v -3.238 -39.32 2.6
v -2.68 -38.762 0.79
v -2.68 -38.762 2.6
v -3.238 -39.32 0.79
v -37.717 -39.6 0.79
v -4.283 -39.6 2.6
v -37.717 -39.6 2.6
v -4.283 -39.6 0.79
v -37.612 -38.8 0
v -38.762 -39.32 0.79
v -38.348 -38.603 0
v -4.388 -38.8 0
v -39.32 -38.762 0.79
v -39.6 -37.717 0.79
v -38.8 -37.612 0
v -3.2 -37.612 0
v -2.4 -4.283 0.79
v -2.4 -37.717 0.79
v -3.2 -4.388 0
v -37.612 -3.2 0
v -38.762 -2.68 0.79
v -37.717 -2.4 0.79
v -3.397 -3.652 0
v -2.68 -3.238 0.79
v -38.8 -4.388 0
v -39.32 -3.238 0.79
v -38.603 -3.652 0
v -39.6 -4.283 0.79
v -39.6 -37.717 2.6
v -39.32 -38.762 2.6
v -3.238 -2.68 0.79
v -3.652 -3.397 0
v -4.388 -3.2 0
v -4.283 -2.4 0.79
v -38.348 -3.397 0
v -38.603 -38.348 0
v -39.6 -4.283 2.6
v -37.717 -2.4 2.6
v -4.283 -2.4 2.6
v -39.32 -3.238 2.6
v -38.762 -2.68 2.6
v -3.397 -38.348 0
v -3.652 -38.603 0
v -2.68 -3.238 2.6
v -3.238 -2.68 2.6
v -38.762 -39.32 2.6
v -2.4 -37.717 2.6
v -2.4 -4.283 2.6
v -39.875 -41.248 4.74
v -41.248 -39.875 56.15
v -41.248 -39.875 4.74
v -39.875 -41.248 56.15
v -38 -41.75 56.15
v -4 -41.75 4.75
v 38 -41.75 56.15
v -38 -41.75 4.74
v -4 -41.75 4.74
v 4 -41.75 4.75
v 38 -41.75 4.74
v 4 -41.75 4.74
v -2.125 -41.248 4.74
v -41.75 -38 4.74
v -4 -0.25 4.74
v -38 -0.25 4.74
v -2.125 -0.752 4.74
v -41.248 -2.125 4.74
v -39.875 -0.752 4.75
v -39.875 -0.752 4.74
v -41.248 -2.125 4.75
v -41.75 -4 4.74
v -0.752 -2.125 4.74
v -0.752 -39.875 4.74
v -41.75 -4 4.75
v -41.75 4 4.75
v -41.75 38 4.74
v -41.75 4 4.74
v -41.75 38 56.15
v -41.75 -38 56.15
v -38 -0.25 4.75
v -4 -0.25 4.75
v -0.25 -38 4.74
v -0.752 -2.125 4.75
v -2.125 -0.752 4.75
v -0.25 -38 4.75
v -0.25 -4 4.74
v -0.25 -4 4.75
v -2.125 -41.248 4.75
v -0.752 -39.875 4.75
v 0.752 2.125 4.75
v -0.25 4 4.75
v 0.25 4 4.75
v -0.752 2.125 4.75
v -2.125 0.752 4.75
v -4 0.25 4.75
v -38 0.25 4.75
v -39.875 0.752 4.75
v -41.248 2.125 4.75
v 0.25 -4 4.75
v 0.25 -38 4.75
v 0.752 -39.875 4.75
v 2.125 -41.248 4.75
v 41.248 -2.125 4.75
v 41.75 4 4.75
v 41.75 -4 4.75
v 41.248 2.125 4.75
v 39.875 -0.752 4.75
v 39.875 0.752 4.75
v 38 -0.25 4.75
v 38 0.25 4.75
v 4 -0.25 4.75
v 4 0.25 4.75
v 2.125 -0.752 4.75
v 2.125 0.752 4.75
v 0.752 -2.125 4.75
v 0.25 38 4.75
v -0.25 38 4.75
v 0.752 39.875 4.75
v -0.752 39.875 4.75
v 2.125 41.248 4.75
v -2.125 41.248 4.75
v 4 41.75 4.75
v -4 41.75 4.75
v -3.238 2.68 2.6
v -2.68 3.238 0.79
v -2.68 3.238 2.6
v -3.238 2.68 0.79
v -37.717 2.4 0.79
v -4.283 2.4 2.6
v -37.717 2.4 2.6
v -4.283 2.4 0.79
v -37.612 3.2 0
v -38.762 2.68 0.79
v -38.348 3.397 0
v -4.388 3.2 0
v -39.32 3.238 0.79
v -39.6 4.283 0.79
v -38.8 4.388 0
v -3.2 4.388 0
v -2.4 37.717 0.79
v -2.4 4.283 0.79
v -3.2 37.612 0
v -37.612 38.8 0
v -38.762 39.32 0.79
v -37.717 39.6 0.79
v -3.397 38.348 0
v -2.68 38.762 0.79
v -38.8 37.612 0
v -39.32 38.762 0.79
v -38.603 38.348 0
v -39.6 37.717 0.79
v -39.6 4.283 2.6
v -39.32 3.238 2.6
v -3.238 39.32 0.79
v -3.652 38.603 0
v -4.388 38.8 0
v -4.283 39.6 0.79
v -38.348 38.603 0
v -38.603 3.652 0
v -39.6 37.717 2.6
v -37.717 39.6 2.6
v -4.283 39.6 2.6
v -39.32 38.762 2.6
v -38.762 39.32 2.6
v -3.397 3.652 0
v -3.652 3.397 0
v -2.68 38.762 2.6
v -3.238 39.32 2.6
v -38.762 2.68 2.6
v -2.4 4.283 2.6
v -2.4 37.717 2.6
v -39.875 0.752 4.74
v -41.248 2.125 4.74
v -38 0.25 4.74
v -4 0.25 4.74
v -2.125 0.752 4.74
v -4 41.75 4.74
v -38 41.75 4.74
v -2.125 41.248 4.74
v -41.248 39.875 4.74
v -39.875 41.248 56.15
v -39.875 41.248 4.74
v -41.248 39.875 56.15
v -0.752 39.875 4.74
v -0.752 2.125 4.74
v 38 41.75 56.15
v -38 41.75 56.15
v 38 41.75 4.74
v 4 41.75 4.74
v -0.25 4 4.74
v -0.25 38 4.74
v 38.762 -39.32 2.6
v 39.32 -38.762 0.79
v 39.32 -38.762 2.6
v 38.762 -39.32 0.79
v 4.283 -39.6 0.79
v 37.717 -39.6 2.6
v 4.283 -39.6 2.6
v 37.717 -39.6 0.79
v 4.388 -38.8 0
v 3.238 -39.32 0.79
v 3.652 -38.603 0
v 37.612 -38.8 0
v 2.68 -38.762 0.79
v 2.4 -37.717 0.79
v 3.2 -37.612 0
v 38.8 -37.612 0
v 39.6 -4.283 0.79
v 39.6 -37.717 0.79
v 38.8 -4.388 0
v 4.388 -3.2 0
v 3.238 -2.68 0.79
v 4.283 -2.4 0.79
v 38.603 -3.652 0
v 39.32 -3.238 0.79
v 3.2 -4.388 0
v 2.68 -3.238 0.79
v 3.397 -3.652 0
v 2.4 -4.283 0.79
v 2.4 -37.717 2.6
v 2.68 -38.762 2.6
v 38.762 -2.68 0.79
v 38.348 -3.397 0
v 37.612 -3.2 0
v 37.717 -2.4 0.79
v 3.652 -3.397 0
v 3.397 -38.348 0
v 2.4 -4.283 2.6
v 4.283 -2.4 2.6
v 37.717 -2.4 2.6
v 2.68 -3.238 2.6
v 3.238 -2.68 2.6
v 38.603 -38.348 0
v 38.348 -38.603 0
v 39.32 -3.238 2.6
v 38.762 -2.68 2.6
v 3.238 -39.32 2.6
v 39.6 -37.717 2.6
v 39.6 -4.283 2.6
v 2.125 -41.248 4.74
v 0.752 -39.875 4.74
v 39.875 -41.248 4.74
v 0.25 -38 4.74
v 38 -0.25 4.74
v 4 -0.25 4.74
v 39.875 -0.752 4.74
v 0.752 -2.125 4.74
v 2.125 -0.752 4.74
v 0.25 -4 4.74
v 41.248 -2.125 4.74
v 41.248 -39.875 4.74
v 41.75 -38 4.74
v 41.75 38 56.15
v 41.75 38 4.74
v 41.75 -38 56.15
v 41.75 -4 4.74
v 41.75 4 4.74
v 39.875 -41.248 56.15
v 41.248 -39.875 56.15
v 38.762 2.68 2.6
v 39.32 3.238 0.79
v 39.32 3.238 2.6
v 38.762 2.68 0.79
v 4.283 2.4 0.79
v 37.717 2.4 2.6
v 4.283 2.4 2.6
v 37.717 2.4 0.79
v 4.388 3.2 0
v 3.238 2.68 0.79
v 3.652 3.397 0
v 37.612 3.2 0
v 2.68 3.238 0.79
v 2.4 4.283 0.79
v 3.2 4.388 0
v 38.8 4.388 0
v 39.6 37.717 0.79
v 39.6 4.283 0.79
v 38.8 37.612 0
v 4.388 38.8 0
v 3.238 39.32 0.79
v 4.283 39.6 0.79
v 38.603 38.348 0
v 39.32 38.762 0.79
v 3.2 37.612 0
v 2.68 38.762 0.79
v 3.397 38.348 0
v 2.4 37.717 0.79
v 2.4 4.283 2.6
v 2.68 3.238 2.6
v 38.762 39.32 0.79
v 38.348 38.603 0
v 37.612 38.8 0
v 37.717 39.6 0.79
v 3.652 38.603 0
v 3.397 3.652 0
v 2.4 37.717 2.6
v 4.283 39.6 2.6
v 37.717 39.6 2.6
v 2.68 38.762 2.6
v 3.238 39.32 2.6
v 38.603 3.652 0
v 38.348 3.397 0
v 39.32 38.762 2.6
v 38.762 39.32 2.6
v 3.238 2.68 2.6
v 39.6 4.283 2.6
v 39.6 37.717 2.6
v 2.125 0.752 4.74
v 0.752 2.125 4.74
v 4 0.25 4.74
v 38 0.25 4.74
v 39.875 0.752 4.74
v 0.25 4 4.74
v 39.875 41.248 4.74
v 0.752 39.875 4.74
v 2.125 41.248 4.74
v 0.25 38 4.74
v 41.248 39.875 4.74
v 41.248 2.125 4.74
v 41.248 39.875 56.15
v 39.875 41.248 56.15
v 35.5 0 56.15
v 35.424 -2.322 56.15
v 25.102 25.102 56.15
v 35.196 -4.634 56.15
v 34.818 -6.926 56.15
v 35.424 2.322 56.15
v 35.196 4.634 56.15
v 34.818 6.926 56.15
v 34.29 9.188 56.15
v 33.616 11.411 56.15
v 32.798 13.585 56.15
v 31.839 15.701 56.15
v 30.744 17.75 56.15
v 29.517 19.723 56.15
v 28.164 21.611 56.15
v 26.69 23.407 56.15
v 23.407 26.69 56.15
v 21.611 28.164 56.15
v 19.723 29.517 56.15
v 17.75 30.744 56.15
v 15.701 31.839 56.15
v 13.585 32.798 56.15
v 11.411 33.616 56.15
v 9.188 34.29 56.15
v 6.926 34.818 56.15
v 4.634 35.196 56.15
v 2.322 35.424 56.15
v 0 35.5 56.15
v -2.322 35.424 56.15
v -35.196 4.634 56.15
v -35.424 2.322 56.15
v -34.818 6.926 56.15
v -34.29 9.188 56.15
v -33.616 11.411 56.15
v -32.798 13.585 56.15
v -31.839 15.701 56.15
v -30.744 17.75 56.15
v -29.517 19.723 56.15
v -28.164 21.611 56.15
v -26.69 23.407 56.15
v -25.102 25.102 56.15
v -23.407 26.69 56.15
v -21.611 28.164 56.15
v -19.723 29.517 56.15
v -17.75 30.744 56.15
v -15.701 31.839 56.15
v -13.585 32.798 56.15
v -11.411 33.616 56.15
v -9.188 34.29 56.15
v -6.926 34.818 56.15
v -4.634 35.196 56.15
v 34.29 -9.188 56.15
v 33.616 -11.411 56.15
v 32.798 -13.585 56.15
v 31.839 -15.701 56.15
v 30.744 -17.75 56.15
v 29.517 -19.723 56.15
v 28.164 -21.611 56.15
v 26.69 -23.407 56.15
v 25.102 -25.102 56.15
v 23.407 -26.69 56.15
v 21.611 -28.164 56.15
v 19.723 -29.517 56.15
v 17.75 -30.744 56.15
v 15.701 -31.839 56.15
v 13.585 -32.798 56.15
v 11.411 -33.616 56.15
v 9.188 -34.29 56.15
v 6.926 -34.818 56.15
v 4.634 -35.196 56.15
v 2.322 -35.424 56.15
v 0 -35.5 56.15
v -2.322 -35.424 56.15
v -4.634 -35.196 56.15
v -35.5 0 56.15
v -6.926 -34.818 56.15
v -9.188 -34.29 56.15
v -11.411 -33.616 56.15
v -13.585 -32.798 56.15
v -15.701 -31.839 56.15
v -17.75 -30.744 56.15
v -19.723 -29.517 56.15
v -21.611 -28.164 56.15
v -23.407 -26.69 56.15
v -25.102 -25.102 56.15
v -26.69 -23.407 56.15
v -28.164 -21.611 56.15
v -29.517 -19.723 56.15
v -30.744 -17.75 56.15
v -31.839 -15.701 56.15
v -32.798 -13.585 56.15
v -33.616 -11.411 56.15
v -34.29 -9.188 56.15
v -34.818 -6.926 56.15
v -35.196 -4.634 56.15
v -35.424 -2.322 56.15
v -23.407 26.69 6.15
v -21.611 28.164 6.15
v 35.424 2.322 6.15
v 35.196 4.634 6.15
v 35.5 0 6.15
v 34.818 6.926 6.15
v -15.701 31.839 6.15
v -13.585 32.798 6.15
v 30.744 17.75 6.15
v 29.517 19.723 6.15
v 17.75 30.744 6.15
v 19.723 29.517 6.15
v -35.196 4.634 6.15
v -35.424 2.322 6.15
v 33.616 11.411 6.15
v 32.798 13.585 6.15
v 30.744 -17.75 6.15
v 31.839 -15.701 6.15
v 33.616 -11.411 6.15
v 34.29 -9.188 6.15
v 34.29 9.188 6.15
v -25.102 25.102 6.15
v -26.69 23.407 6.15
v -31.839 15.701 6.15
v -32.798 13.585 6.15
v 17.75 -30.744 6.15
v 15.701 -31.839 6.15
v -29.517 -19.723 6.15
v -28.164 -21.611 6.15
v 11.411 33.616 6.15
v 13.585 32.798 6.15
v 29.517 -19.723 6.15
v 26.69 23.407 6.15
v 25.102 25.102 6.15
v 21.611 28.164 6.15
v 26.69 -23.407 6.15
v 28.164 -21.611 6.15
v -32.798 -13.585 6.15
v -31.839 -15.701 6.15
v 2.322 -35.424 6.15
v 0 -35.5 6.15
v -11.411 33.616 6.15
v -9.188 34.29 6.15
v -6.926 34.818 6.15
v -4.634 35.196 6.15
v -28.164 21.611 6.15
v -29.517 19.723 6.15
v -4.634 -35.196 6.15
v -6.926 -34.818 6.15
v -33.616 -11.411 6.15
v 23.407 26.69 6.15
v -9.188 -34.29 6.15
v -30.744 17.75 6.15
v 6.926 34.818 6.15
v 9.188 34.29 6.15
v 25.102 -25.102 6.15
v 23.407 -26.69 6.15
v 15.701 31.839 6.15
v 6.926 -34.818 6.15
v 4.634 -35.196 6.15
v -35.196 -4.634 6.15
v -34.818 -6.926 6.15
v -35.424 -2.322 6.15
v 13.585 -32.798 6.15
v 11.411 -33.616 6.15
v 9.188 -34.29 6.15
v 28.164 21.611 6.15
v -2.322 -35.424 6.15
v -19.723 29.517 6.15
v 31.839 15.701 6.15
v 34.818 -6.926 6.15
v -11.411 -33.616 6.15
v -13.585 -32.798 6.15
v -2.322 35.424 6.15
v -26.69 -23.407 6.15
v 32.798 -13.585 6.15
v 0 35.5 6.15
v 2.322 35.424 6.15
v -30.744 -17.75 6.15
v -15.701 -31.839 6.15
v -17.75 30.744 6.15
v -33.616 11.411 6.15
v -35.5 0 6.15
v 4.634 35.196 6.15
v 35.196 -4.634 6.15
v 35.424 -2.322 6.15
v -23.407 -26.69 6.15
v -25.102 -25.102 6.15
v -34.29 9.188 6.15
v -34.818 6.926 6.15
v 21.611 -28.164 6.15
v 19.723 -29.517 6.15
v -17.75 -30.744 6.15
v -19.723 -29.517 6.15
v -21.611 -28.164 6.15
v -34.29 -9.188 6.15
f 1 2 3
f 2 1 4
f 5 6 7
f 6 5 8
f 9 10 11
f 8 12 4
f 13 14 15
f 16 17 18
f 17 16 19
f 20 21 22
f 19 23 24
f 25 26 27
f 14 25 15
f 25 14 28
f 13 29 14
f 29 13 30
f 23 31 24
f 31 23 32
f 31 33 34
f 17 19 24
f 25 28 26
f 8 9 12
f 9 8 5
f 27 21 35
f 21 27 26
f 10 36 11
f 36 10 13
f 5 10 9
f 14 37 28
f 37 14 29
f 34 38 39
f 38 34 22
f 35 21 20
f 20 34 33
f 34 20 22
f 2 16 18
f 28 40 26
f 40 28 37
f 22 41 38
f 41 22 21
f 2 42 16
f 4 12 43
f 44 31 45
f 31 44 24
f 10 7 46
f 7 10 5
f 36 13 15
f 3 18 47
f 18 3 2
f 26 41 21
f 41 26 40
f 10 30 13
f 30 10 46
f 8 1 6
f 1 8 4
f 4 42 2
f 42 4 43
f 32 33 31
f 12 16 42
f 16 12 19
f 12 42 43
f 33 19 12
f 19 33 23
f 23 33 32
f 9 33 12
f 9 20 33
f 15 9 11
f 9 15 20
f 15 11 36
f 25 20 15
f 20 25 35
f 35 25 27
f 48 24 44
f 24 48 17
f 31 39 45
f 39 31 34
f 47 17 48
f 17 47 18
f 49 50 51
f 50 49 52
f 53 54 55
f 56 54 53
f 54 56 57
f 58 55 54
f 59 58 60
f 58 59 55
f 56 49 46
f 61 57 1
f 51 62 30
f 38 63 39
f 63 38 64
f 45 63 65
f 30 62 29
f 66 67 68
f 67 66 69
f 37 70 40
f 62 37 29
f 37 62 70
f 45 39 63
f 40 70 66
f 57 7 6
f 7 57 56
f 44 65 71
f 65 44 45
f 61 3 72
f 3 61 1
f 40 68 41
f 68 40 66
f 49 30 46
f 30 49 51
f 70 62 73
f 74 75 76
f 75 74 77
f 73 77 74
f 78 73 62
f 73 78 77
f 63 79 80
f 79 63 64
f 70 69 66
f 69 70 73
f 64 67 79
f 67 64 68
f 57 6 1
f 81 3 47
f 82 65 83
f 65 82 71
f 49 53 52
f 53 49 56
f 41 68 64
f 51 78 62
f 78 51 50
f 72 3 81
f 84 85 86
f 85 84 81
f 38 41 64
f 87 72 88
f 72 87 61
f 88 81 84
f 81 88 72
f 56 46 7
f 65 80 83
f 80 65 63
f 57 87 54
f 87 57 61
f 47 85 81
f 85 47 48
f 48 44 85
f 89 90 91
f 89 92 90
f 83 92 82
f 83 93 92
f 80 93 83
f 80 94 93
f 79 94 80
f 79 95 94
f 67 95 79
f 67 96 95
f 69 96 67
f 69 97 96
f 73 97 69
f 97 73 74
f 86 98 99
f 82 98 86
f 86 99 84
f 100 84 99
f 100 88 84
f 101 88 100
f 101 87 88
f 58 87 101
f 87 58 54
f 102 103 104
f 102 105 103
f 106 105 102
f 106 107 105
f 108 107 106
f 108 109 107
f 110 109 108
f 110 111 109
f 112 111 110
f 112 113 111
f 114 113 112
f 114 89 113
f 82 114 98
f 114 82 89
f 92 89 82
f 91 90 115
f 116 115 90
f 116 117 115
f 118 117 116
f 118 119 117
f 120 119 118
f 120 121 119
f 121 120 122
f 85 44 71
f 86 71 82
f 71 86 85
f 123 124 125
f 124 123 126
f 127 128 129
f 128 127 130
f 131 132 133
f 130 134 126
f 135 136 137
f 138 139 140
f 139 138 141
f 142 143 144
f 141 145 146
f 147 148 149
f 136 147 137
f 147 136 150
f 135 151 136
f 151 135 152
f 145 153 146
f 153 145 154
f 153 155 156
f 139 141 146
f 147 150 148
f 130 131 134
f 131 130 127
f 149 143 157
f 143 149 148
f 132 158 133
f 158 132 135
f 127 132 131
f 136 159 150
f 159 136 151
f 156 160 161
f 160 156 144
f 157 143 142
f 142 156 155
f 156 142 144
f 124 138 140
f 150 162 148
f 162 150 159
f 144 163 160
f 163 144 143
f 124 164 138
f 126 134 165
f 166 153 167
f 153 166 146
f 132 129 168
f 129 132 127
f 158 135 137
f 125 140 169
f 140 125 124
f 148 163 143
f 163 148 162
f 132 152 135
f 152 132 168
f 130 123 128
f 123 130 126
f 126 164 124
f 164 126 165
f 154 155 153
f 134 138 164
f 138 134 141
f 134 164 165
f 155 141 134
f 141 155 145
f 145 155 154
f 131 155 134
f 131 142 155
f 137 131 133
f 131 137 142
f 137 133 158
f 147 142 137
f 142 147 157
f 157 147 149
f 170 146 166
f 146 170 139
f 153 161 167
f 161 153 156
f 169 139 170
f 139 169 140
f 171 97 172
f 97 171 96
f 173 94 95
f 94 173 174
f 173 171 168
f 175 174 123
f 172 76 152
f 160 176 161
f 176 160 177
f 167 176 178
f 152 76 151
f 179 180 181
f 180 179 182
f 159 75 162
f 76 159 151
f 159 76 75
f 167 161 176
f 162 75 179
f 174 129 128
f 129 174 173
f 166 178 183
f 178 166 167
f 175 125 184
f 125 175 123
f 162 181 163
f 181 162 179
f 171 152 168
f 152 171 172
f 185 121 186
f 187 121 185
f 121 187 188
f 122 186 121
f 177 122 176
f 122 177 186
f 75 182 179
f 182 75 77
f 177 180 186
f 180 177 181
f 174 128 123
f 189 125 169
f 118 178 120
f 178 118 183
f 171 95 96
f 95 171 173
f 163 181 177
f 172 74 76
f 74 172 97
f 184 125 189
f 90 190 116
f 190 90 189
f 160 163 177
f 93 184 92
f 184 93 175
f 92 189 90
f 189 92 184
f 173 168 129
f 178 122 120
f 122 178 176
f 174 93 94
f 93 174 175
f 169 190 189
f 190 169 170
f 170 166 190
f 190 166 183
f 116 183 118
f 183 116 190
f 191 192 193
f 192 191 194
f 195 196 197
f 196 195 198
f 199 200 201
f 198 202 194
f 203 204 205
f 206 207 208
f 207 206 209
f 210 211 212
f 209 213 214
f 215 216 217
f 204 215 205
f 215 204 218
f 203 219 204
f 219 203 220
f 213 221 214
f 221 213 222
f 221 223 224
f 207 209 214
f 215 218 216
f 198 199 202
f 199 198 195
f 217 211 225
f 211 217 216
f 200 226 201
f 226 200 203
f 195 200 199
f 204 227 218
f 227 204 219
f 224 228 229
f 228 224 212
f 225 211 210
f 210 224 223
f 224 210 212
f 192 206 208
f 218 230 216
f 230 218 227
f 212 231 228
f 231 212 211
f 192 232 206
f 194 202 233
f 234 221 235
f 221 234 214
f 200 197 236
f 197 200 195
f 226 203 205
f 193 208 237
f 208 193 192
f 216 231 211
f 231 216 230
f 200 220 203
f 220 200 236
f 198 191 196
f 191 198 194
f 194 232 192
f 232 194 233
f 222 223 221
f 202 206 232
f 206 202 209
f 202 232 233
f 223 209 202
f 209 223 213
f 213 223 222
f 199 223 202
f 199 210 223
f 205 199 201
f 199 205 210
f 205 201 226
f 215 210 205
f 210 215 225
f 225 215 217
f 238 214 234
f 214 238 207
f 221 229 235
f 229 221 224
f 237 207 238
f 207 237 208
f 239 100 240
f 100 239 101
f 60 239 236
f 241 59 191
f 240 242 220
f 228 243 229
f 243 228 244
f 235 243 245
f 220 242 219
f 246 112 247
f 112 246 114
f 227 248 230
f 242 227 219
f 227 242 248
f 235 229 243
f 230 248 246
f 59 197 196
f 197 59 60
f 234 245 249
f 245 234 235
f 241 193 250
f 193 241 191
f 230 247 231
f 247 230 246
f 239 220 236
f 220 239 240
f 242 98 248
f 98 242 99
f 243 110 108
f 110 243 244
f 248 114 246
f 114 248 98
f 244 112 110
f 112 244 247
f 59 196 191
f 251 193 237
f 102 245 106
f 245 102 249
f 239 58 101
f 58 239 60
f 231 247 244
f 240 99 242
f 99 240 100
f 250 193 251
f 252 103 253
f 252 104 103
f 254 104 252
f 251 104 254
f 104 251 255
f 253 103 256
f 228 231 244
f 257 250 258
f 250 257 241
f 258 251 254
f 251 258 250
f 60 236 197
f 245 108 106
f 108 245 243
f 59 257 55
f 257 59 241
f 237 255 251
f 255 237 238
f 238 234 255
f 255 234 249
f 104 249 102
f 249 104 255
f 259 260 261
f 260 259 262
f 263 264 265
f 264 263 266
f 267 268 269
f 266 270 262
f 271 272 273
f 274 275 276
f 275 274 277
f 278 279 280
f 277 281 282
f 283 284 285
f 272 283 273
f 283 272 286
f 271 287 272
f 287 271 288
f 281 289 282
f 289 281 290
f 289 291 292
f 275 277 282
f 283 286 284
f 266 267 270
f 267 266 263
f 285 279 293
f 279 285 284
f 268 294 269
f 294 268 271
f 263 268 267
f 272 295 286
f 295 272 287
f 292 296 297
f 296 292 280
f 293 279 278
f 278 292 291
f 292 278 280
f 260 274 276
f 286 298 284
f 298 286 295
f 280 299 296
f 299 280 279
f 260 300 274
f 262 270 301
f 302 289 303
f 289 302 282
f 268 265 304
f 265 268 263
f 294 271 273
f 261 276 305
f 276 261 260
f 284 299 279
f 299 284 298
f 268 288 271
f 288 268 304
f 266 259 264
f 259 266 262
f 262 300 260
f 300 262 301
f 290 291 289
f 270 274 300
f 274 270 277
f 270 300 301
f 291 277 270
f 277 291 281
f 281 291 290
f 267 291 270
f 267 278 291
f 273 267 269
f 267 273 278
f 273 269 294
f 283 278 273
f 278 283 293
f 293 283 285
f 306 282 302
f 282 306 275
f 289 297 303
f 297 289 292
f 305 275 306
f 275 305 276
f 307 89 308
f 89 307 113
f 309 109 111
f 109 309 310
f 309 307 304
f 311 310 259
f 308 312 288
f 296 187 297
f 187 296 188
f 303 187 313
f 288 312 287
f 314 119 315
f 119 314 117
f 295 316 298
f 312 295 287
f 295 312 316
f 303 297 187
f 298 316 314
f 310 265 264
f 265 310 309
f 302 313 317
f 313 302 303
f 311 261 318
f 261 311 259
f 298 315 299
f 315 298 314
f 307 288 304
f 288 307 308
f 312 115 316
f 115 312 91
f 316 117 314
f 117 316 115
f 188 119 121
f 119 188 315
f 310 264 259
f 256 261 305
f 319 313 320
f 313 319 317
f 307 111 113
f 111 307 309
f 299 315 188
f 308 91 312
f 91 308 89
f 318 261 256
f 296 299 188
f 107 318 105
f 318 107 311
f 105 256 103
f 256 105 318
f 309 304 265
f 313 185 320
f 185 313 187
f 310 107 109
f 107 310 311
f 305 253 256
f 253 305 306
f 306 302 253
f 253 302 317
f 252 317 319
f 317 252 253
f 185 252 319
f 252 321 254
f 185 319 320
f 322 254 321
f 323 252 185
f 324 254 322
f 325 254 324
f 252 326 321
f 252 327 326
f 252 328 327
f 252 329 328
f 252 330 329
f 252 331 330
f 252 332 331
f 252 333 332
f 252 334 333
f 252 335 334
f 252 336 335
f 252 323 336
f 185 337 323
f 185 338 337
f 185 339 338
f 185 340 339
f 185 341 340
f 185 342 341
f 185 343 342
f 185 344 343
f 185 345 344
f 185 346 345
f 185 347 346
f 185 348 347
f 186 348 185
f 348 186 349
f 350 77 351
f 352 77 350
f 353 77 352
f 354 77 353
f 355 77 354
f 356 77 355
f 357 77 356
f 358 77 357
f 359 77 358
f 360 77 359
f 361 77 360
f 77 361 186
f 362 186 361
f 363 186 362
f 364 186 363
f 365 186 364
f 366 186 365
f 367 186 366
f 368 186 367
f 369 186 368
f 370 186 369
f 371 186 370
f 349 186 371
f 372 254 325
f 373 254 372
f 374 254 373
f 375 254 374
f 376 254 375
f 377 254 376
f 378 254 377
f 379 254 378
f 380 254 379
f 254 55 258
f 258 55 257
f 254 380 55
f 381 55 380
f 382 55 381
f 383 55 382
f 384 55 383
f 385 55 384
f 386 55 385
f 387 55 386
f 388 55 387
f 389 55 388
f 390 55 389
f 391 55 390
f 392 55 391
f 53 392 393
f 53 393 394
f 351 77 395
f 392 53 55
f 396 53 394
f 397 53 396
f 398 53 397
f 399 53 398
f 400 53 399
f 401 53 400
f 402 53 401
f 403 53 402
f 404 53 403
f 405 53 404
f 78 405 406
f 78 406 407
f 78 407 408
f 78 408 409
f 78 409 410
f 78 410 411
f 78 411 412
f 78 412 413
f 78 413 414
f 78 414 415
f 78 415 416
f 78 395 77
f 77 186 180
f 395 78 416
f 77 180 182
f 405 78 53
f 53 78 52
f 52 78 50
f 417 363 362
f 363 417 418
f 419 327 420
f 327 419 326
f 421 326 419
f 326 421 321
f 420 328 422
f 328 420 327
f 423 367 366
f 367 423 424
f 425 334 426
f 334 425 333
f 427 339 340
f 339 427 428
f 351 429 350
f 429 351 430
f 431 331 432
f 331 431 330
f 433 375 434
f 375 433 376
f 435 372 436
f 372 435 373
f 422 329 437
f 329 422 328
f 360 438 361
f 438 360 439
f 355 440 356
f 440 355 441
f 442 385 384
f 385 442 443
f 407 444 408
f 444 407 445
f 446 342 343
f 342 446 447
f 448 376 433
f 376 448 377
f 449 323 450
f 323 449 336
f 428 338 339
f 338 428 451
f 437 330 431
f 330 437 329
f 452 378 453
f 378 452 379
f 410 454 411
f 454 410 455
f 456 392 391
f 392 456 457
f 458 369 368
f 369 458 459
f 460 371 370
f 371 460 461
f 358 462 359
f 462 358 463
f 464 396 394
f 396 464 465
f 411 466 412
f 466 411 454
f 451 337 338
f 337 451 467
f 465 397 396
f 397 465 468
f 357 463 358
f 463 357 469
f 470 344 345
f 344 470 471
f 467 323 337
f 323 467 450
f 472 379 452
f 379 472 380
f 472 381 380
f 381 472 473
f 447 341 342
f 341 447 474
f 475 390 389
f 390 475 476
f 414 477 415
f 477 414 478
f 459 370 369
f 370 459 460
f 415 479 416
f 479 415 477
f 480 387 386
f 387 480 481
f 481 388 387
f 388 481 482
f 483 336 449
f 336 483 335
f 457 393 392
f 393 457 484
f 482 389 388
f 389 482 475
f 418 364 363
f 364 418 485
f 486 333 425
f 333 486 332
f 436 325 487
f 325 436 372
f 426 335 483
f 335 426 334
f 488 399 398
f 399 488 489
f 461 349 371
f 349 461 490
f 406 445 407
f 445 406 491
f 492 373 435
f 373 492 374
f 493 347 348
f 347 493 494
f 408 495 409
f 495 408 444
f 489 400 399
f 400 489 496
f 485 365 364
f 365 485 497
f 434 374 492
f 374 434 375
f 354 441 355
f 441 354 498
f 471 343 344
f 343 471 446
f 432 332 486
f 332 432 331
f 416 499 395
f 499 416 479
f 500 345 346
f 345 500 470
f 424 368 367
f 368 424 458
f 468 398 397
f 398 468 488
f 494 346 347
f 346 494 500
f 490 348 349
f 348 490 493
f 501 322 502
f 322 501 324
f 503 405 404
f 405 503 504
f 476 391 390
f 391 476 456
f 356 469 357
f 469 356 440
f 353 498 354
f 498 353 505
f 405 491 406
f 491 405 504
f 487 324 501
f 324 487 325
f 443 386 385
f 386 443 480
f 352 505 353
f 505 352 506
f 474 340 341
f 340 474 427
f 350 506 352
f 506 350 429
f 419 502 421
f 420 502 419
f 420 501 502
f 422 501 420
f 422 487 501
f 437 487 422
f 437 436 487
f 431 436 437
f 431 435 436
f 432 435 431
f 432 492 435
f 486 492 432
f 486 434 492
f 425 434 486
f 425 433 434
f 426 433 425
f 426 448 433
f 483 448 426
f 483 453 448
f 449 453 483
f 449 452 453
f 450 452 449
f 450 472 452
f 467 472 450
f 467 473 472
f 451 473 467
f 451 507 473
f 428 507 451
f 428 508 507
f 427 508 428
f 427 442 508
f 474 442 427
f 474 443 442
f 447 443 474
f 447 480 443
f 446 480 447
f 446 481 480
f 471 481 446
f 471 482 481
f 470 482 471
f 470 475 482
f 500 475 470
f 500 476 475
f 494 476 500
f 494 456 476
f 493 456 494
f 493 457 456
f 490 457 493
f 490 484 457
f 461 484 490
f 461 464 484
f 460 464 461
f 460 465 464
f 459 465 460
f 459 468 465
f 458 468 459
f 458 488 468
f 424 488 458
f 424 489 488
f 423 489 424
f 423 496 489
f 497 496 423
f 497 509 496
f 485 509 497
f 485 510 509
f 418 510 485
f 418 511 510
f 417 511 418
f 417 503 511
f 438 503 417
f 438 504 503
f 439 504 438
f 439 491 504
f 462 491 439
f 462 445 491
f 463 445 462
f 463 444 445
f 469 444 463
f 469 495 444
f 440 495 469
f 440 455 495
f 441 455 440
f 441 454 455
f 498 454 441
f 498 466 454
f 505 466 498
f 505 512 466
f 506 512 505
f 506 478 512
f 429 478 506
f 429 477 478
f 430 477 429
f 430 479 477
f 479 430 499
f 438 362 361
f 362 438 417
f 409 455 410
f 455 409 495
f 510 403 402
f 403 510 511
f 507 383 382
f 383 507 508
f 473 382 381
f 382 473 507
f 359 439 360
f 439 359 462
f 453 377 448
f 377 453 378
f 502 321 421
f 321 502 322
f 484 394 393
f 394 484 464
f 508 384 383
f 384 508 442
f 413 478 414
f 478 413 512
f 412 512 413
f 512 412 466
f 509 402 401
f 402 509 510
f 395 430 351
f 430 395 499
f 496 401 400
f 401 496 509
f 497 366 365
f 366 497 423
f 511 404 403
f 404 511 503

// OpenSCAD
// file: ../lib/vessel.scad
// SPDX-License-Identifier: MIT
// Copyright (c) 2026 Aaron Cupp
//
// vessel.scad — parametric collar cups for bottles, cans, and pen-form tools.
//
// A collar cup is a solid Gridfinity block with cylindrical bores sunk into it.
// It LOCATES a vessel; it does not clamp one. That distinction is the whole
// design: a collar that grips harder than the bin weighs comes out of the
// baseplate with the bottle when you grab it one-handed. Clearance, not
// interference — CLR is per-diameter, not per-side.
//
// Capture depth is roughly a third of the vessel's height. Enough to resist a
// knock (this bench sits under a 180 W fume-extractor intake), not so much that
// you're fishing the bottle out.
//
//   collar_cup(nx, ny, vessel_d, capture_h, …)   — one centred bore
//   collar_cup_multi(nx, ny, bores, capture_h, …) — bores = [[x, y, d], …]
//
// Cord slot: pen-form tools that stand in a cup are usually corded (the HARDELL
// rotary tool takes a barrel jack). Without a slot the lead drapes over the rim
// and levers the tool sideways. `cord_w > 0` cuts a channel from the bore out
// through the wall, open to the top.

include <gridfinity.scad>

CLR      = 1.0;   // bore = vessel_d + CLR. Loose on purpose — see above.
MIN_WALL = 1.2;   // minimum material between two bores, and bore to outer face

// ---- geometry guards ----
// Overlapping bores and bores that break out through the side wall both still
// render as perfectly watertight, 2-manifold meshes — CI cannot tell you the
// part is wrong, only that it is closed. These asserts encode the intent that
// the mesh check can't. Cheap, and they fire at render time rather than on the
// printer.
function _pair_gaps(bores, clr) = [
    for (i = [0 : len(bores)-1], j = [0 : len(bores)-1]) if (i < j)
        norm([bores[i][0]-bores[j][0], bores[i][1]-bores[j][1]])
        - (bores[i][2]+clr)/2 - (bores[j][2]+clr)/2
];
function _edge_gaps(bores, clr, W, D) = [
    for (b = bores) min(W/2 - abs(b[0]) - (b[2]+clr)/2,
                        D/2 - abs(b[1]) - (b[2]+clr)/2)
];

// Multi-bore block. Bores are [x, y, diameter] in mm, relative to the block centre.
module collar_cup_multi(nx, ny, bores, capture_h, floor = 1.4, clr = CLR,
                        cord_w = 0, cord_at = 0, min_wall = MIN_WALL) {
    h = BIN_BASE_H + floor + capture_h;
    e = 0.1;
    W = nx*GF - 0.5; D = ny*GF - 0.5;
    _pg = _pair_gaps(bores, clr);
    _eg = _edge_gaps(bores, clr, W, D);
    assert(len(_pg) == 0 || min(_pg) >= min_wall,
           "collar_cup: bores are too close — they would merge into one pocket");
    assert(min(_eg) >= min_wall,
           "collar_cup: a bore breaches the outer wall — block needs more units");
    difference() {
        bin_blank(nx, ny, h);
        for (b = bores)
            translate([b[0], b[1], BIN_BASE_H + floor])
                cylinder(d = b[2] + clr, h = capture_h + e, $fn = 96);
        // Cord channel: from the first bore outward through the +X wall, open to
        // the rim so the lead drops in from above rather than threading.
        if (cord_w > 0)
            translate([bores[0][0], bores[0][1] - cord_w/2, BIN_BASE_H + floor + cord_at])
                cube([nx*GF, cord_w, h]);
    }
}

// Single centred bore — the common case.
module collar_cup(nx, ny, vessel_d, capture_h, floor = 1.4, clr = CLR,
                  cord_w = 0, cord_at = 0, min_wall = MIN_WALL) {
    collar_cup_multi(nx, ny, [[0, 0, vessel_d]], capture_h, floor, clr,
                     cord_w, cord_at, min_wall);
}

// Evenly spaced row of same-depth bores along X — for a rank of aerosol cans.
// Returns geometry, not a list; pass the diameters and it lays them out on the
// block's centre line.
module collar_cup_row(nx, ny, diameters, capture_h, floor = 1.4, clr = CLR,
                      min_wall = MIN_WALL) {
    n = len(diameters);
    pitch = nx * GF / n;
    collar_cup_multi(nx, ny,
        [for (i = [0 : n-1]) [(i - (n-1)/2) * pitch, 0, diameters[i]]],
        capture_h, floor, clr, 0, 0, min_wall);
}
// file: cleaning_station_common.scad
// cleaning_station_common.scad — shared parameters for the bench cleaning station.
//
// The IPA / contact-cleaner corner of the electronics repair bench. Everything
// here is measured off the actual items with calipers; nothing is a nominal from
// a product page. Diameters carry a per-diameter clearance (lib/vessel.scad CLR),
// not per-side.
//
// This corner sits under a fume-extractor intake, which drives two decisions:
//   * Cups CAPTURE the vessel rather than clamp it — a collar that grips harder
//     than the bin weighs lifts out of the baseplate with the bottle.
//   * Bins stay as low as the job allows. Capture velocity is decided in the
//     first six inches, and a wall of tall bins in front of the hood costs it.
//
// The aerosols are FLAMMABLE and this bench has a 400 °C iron on it. These cups
// are for working cans only; bulk stock belongs away from the hood entirely.
//
// SPDX-License-Identifier: CC-BY-NC-SA-4.0
// Copyright (c) 2026 Aaron Cupp

include <../lib/vessel.scad>

// ---- measured diameters (mm) ----
// DeoxIT bore: taken from the PART, not from a can measurement.
//
// The 2026-08-20 print had three bores — 57.00 / 55.20 / 52.75. The 57.00 fits a
// DeoxIT; 55.20 barely does; 52.75 holds nothing. So 57.00 is a validated bore,
// which beats re-deriving it from a can diameter plus a clearance guess. D5, F5
// and G5 are the same can, so one bore serves all three.
BORE_DEOXIT = 57.00;   // ✅ proven by the printed part

// Freeze spray is a DIFFERENT, LARGER can — 13 mm wider than a DeoxIT, which is
// why it never fitted a shared block.
D_FREEZE_SPRAY = 69.00;   // ✅ measured 2026-08-20 (was 56.00, badly wrong)
FREEZE_CLR     = 2.0;     // [1:0.5:4] -> 71.00 bore
FREEZE_MEASURED = true;

D_DISPENSER    = 53.50;   // 200 ml push-down alcohol pump, square base across flats
D_FLOOD_BOTTLE = 75.50;

// DeoxIT D100 / F100 / G100 concentrate droppers — bare bottles, out of their
// kit boxes. The boxes are a full 2×1 EACH; the three bare bottles share one.
// NOT ROUND — 39 × 20 is a flattened cross-section, not a diameter and a height.
D_DROPPER_L = 39.00;   // measured 2026-08-20, long axis of the footprint
D_DROPPER_W = 20.00;   // measured, short axis
DROPPER_CLR = 1.00;    // per dimension, matching the CLR convention
CAP_DROPPER = 26;      // [8:1:40] capture depth. ⚠️ bottle HEIGHT is unmeasured —
                       //   39 turned out to be a footprint, so the height nobody
                       //   has taken.
                       //   RAISED 15 → 26 on 2026-08-24: at 15 the brushes and
                       //   swabs fell over in their slots. Depth is what resists
                       //   an applicator tipping, and 15 mm of it on a ~100 mm
                       //   brush is almost none. 26 makes the whole block half
                       //   again as tall, which is what was asked for.
                       //   Read the bin_deoxit_droppers header before assuming
                       //   this alone fixes the tipping — it does not.

// ---- melamine sponges (mm) — 3.94 × 2.35 × 0.79 in ----
// Full block as sold. Bulk stock lives in the bag under the desk, ~100 of them;
// none of it competes for grid.
SPONGE_L = 100.1; SPONGE_W = 59.7; SPONGE_T = 20.1;

// WORKING size: a full block is far more sponge than any bench task needs, and
// melamine is consumed by abrasion — quartering one gets four uses out of what
// was one, and the smaller piece reaches between connectors where a 100 mm block
// cannot. Halve across, halve lengthwise.
CUT_L = SPONGE_L / 2;   // 50.05
CUT_W = SPONGE_W / 2;   // 29.85
CUT_T = SPONGE_T;       // 20.1 — unchanged, cuts are through the face

// ---- capture depth ----
// Vessel HEIGHTS were not measured, so this is a judgement call rather than a
// derived third-of-height: 50 mm resists a knock without making the bottles a
// two-handed retrieval. One number to change if the first print feels wrong.
CAPTURE = 50;

// Sponge bin: sponges stand ON EDGE (60 mm tall), ~4 across the 81 mm interior.
// On edge beats flat-stacked — same count in a 68 mm bin instead of a 107 mm one,
// and any sponge can be pinched out rather than peeling off the top of a pile.
// Height is set by a FULL block standing on edge, not a cut one — so one uncut
// block can still ride in the bin as reserve alongside the trimmed pieces.
// Cut pieces are 50 long, which is what lets the footprint drop to 2×2.
SPONGE_BIN_H = SPONGE_W + BIN_BASE_H + 1.4 + 2;   // ≈ 68
// main file
// bin_freeze_spray — 2×2 cup for the freeze spray can.
//
// Its own part because the can is 69 mm — 13 mm wider than a DeoxIT. Sharing a
// block with them forced one bore to cover both, and neither fitted.
//
// 2 mm clearance rather than lib/vessel.scad's 1.0: that figure is per-diameter
// and sized around a ~19 mm syringe, so on a 69 mm can it is proportionally far
// tighter. The DeoxIT bears this out — its can sits well in 57.00 and "barely"
// in 55.20, i.e. ~2 mm is the fit that works and ~0.5 mm is not.
//
// PRINT: as emitted, feet down. No supports.
//
// SPDX-License-Identifier: CC-BY-NC-SA-4.0
// Copyright (c) 2026 Aaron Cupp
include <cleaning_station_common.scad>
collar_cup(2, 2, D_FREEZE_SPRAY, CAPTURE, clr = FREEZE_CLR);
